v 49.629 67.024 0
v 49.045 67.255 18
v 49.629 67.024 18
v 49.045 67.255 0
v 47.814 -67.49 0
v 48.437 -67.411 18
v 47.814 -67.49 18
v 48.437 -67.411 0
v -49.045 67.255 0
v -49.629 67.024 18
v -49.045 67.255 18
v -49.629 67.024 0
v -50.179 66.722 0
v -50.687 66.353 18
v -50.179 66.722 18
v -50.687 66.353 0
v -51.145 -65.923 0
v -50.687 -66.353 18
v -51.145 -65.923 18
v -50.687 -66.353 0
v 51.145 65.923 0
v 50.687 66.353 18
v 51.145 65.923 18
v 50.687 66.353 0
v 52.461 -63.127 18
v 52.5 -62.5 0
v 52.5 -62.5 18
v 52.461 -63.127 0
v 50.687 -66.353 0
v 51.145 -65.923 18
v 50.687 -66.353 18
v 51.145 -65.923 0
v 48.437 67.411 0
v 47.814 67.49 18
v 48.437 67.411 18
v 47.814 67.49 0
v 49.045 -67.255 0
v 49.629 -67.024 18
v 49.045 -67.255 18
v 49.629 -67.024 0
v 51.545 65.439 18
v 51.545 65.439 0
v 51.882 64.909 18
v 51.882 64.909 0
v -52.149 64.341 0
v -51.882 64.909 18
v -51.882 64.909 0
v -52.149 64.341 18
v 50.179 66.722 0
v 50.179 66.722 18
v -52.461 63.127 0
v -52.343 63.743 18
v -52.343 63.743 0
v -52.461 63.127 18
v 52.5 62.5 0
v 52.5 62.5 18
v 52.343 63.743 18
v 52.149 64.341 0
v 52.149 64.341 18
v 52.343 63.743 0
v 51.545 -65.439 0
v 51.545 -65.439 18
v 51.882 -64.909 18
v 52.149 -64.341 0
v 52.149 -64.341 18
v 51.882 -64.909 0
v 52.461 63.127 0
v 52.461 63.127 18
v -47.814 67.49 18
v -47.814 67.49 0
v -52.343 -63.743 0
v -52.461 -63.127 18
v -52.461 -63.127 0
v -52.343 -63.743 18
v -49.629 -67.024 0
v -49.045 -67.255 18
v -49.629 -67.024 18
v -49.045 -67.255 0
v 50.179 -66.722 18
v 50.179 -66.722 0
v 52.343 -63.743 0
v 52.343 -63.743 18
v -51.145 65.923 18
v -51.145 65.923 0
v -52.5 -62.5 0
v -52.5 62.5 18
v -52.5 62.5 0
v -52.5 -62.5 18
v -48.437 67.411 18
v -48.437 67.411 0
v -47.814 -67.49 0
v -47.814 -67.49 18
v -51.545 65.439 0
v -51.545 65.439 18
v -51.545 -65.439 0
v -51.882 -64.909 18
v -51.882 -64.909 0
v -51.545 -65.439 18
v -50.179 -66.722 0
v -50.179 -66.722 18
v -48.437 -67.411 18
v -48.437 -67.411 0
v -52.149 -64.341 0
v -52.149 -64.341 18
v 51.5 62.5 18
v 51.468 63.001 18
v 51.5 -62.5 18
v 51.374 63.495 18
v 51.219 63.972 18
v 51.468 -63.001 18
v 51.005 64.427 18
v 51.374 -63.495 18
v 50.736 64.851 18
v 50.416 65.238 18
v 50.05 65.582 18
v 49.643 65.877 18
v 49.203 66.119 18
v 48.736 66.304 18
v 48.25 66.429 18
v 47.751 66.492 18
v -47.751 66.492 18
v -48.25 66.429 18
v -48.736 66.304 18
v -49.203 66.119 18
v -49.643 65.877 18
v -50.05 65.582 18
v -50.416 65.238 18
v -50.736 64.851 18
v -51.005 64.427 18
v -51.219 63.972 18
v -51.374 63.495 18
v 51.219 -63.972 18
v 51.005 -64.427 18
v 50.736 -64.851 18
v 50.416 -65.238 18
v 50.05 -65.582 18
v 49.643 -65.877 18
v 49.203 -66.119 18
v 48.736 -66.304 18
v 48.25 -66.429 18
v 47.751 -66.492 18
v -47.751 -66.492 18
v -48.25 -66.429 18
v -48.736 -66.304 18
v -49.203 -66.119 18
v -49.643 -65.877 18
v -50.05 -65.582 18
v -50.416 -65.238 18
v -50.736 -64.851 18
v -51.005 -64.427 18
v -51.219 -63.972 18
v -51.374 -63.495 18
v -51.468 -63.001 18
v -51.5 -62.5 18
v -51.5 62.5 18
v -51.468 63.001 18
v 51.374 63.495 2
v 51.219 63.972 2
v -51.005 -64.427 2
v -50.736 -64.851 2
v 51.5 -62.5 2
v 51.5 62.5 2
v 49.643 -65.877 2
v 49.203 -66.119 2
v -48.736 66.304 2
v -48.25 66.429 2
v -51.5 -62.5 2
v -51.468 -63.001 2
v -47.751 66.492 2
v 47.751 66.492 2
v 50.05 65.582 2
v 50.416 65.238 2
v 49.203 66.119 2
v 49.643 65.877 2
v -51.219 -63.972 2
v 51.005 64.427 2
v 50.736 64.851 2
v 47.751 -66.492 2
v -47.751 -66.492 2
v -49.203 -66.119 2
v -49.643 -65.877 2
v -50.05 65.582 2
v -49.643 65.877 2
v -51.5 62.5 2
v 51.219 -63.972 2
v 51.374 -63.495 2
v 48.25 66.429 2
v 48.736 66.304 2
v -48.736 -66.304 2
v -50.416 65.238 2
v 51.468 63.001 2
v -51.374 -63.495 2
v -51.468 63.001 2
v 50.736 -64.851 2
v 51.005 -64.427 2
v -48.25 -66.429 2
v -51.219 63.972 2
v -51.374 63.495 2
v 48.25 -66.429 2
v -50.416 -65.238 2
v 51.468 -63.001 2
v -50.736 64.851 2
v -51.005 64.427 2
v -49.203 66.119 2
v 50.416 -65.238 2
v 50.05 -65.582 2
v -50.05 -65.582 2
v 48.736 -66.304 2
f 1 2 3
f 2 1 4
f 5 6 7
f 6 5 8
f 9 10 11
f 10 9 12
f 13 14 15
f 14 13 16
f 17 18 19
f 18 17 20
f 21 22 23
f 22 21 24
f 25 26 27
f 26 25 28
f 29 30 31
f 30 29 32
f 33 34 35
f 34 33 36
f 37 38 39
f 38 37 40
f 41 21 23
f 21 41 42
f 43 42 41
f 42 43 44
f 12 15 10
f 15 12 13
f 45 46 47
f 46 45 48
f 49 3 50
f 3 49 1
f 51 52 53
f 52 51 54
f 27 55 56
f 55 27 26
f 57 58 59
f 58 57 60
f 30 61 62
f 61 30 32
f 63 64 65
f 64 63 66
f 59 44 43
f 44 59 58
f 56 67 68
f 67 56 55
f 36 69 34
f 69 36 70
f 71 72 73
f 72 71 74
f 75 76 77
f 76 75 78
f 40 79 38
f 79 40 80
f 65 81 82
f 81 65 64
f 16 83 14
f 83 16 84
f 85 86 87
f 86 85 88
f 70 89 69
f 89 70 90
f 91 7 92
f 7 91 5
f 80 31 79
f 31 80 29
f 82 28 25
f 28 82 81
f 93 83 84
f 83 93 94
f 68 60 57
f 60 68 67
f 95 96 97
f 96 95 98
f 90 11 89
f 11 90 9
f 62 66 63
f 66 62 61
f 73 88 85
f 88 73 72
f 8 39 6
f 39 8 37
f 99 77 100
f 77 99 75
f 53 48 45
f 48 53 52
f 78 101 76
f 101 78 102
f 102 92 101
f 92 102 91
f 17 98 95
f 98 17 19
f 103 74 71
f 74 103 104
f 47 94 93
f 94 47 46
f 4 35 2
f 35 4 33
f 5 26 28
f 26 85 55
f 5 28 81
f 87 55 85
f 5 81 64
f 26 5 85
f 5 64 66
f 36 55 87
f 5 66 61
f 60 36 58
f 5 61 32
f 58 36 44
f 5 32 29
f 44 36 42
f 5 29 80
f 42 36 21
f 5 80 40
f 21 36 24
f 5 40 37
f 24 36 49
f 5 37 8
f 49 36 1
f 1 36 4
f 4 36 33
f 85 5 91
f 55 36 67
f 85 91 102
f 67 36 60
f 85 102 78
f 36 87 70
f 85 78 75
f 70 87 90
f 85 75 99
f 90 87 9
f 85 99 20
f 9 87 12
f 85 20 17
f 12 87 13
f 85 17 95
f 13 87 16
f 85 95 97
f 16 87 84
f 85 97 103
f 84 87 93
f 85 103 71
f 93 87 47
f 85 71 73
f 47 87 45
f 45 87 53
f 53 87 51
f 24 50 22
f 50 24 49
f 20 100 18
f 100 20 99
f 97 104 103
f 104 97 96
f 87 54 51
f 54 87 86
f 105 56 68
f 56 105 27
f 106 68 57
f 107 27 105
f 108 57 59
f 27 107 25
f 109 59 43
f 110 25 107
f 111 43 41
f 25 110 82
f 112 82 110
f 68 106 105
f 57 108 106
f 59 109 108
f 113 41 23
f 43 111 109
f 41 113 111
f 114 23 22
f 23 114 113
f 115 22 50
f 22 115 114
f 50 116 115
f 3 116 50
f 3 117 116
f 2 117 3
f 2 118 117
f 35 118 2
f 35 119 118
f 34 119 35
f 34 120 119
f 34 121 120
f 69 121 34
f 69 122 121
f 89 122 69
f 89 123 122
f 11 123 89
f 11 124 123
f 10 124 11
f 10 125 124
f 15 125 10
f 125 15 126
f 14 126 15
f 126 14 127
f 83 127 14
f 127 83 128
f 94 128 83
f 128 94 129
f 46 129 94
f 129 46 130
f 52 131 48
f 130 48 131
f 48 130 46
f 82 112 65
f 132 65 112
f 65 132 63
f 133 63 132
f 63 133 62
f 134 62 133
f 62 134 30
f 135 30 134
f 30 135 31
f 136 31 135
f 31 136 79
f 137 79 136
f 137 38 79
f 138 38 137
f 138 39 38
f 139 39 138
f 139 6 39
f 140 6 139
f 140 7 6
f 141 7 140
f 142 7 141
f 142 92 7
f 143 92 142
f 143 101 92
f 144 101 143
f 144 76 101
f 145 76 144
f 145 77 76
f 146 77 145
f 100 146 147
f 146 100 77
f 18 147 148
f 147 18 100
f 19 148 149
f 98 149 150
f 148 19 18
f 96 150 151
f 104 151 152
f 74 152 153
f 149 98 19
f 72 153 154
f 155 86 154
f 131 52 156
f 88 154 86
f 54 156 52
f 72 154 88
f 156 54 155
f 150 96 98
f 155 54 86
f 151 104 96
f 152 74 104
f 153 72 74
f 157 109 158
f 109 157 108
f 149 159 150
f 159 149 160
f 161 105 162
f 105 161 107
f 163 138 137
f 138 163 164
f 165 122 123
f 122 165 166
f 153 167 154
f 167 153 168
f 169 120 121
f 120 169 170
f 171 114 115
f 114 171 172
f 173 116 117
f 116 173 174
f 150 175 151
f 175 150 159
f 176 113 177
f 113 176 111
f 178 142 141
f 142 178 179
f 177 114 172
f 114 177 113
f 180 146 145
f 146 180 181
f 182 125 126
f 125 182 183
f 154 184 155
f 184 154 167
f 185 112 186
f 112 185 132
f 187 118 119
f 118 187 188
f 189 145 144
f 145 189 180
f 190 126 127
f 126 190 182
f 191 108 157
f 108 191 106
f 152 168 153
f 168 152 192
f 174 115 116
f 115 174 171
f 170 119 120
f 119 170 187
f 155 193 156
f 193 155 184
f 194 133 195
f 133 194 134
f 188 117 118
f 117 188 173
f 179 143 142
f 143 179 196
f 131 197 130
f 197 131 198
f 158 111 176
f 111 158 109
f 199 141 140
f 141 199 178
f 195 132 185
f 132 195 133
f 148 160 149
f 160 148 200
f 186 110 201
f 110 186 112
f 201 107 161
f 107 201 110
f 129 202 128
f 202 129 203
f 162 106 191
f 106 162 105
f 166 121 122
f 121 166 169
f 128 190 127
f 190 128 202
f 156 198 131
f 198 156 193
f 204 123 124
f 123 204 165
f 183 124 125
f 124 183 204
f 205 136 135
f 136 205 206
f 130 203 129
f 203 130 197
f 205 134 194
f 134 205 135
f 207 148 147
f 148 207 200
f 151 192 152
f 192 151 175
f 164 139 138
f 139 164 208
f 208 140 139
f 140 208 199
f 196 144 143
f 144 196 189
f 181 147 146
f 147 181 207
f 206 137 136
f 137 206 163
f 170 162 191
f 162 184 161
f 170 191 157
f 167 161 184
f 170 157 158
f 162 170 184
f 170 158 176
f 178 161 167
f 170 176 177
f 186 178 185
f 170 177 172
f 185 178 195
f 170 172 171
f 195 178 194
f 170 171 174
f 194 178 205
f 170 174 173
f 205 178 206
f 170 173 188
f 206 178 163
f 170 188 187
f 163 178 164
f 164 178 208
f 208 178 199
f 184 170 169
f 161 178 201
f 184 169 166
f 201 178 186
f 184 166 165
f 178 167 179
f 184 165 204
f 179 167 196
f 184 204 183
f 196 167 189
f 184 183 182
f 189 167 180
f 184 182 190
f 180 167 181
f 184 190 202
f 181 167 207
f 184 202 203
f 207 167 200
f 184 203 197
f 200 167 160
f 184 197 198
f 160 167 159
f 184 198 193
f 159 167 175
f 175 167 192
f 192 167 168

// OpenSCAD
$fn = 50;


difference() {
	union() {
		hull() {
			translate(v = [-47.5000000000, 62.5000000000, 0]) {
				cylinder(h = 18, r = 5);
			}
			translate(v = [47.5000000000, 62.5000000000, 0]) {
				cylinder(h = 18, r = 5);
			}
			translate(v = [-47.5000000000, -62.5000000000, 0]) {
				cylinder(h = 18, r = 5);
			}
			translate(v = [47.5000000000, -62.5000000000, 0]) {
				cylinder(h = 18, r = 5);
			}
		}
	}
	union() {
		translate(v = [0, 0, 2]) {
			hull() {
				translate(v = [-47.5000000000, 62.5000000000, 0]) {
					cylinder(h = 16, r = 4);
				}
				translate(v = [47.5000000000, 62.5000000000, 0]) {
					cylinder(h = 16, r = 4);
				}
				translate(v = [-47.5000000000, -62.5000000000, 0]) {
					cylinder(h = 16, r = 4);
				}
				translate(v = [47.5000000000, -62.5000000000, 0]) {
					cylinder(h = 16, r = 4);
				}
			}
		}
	}
}
